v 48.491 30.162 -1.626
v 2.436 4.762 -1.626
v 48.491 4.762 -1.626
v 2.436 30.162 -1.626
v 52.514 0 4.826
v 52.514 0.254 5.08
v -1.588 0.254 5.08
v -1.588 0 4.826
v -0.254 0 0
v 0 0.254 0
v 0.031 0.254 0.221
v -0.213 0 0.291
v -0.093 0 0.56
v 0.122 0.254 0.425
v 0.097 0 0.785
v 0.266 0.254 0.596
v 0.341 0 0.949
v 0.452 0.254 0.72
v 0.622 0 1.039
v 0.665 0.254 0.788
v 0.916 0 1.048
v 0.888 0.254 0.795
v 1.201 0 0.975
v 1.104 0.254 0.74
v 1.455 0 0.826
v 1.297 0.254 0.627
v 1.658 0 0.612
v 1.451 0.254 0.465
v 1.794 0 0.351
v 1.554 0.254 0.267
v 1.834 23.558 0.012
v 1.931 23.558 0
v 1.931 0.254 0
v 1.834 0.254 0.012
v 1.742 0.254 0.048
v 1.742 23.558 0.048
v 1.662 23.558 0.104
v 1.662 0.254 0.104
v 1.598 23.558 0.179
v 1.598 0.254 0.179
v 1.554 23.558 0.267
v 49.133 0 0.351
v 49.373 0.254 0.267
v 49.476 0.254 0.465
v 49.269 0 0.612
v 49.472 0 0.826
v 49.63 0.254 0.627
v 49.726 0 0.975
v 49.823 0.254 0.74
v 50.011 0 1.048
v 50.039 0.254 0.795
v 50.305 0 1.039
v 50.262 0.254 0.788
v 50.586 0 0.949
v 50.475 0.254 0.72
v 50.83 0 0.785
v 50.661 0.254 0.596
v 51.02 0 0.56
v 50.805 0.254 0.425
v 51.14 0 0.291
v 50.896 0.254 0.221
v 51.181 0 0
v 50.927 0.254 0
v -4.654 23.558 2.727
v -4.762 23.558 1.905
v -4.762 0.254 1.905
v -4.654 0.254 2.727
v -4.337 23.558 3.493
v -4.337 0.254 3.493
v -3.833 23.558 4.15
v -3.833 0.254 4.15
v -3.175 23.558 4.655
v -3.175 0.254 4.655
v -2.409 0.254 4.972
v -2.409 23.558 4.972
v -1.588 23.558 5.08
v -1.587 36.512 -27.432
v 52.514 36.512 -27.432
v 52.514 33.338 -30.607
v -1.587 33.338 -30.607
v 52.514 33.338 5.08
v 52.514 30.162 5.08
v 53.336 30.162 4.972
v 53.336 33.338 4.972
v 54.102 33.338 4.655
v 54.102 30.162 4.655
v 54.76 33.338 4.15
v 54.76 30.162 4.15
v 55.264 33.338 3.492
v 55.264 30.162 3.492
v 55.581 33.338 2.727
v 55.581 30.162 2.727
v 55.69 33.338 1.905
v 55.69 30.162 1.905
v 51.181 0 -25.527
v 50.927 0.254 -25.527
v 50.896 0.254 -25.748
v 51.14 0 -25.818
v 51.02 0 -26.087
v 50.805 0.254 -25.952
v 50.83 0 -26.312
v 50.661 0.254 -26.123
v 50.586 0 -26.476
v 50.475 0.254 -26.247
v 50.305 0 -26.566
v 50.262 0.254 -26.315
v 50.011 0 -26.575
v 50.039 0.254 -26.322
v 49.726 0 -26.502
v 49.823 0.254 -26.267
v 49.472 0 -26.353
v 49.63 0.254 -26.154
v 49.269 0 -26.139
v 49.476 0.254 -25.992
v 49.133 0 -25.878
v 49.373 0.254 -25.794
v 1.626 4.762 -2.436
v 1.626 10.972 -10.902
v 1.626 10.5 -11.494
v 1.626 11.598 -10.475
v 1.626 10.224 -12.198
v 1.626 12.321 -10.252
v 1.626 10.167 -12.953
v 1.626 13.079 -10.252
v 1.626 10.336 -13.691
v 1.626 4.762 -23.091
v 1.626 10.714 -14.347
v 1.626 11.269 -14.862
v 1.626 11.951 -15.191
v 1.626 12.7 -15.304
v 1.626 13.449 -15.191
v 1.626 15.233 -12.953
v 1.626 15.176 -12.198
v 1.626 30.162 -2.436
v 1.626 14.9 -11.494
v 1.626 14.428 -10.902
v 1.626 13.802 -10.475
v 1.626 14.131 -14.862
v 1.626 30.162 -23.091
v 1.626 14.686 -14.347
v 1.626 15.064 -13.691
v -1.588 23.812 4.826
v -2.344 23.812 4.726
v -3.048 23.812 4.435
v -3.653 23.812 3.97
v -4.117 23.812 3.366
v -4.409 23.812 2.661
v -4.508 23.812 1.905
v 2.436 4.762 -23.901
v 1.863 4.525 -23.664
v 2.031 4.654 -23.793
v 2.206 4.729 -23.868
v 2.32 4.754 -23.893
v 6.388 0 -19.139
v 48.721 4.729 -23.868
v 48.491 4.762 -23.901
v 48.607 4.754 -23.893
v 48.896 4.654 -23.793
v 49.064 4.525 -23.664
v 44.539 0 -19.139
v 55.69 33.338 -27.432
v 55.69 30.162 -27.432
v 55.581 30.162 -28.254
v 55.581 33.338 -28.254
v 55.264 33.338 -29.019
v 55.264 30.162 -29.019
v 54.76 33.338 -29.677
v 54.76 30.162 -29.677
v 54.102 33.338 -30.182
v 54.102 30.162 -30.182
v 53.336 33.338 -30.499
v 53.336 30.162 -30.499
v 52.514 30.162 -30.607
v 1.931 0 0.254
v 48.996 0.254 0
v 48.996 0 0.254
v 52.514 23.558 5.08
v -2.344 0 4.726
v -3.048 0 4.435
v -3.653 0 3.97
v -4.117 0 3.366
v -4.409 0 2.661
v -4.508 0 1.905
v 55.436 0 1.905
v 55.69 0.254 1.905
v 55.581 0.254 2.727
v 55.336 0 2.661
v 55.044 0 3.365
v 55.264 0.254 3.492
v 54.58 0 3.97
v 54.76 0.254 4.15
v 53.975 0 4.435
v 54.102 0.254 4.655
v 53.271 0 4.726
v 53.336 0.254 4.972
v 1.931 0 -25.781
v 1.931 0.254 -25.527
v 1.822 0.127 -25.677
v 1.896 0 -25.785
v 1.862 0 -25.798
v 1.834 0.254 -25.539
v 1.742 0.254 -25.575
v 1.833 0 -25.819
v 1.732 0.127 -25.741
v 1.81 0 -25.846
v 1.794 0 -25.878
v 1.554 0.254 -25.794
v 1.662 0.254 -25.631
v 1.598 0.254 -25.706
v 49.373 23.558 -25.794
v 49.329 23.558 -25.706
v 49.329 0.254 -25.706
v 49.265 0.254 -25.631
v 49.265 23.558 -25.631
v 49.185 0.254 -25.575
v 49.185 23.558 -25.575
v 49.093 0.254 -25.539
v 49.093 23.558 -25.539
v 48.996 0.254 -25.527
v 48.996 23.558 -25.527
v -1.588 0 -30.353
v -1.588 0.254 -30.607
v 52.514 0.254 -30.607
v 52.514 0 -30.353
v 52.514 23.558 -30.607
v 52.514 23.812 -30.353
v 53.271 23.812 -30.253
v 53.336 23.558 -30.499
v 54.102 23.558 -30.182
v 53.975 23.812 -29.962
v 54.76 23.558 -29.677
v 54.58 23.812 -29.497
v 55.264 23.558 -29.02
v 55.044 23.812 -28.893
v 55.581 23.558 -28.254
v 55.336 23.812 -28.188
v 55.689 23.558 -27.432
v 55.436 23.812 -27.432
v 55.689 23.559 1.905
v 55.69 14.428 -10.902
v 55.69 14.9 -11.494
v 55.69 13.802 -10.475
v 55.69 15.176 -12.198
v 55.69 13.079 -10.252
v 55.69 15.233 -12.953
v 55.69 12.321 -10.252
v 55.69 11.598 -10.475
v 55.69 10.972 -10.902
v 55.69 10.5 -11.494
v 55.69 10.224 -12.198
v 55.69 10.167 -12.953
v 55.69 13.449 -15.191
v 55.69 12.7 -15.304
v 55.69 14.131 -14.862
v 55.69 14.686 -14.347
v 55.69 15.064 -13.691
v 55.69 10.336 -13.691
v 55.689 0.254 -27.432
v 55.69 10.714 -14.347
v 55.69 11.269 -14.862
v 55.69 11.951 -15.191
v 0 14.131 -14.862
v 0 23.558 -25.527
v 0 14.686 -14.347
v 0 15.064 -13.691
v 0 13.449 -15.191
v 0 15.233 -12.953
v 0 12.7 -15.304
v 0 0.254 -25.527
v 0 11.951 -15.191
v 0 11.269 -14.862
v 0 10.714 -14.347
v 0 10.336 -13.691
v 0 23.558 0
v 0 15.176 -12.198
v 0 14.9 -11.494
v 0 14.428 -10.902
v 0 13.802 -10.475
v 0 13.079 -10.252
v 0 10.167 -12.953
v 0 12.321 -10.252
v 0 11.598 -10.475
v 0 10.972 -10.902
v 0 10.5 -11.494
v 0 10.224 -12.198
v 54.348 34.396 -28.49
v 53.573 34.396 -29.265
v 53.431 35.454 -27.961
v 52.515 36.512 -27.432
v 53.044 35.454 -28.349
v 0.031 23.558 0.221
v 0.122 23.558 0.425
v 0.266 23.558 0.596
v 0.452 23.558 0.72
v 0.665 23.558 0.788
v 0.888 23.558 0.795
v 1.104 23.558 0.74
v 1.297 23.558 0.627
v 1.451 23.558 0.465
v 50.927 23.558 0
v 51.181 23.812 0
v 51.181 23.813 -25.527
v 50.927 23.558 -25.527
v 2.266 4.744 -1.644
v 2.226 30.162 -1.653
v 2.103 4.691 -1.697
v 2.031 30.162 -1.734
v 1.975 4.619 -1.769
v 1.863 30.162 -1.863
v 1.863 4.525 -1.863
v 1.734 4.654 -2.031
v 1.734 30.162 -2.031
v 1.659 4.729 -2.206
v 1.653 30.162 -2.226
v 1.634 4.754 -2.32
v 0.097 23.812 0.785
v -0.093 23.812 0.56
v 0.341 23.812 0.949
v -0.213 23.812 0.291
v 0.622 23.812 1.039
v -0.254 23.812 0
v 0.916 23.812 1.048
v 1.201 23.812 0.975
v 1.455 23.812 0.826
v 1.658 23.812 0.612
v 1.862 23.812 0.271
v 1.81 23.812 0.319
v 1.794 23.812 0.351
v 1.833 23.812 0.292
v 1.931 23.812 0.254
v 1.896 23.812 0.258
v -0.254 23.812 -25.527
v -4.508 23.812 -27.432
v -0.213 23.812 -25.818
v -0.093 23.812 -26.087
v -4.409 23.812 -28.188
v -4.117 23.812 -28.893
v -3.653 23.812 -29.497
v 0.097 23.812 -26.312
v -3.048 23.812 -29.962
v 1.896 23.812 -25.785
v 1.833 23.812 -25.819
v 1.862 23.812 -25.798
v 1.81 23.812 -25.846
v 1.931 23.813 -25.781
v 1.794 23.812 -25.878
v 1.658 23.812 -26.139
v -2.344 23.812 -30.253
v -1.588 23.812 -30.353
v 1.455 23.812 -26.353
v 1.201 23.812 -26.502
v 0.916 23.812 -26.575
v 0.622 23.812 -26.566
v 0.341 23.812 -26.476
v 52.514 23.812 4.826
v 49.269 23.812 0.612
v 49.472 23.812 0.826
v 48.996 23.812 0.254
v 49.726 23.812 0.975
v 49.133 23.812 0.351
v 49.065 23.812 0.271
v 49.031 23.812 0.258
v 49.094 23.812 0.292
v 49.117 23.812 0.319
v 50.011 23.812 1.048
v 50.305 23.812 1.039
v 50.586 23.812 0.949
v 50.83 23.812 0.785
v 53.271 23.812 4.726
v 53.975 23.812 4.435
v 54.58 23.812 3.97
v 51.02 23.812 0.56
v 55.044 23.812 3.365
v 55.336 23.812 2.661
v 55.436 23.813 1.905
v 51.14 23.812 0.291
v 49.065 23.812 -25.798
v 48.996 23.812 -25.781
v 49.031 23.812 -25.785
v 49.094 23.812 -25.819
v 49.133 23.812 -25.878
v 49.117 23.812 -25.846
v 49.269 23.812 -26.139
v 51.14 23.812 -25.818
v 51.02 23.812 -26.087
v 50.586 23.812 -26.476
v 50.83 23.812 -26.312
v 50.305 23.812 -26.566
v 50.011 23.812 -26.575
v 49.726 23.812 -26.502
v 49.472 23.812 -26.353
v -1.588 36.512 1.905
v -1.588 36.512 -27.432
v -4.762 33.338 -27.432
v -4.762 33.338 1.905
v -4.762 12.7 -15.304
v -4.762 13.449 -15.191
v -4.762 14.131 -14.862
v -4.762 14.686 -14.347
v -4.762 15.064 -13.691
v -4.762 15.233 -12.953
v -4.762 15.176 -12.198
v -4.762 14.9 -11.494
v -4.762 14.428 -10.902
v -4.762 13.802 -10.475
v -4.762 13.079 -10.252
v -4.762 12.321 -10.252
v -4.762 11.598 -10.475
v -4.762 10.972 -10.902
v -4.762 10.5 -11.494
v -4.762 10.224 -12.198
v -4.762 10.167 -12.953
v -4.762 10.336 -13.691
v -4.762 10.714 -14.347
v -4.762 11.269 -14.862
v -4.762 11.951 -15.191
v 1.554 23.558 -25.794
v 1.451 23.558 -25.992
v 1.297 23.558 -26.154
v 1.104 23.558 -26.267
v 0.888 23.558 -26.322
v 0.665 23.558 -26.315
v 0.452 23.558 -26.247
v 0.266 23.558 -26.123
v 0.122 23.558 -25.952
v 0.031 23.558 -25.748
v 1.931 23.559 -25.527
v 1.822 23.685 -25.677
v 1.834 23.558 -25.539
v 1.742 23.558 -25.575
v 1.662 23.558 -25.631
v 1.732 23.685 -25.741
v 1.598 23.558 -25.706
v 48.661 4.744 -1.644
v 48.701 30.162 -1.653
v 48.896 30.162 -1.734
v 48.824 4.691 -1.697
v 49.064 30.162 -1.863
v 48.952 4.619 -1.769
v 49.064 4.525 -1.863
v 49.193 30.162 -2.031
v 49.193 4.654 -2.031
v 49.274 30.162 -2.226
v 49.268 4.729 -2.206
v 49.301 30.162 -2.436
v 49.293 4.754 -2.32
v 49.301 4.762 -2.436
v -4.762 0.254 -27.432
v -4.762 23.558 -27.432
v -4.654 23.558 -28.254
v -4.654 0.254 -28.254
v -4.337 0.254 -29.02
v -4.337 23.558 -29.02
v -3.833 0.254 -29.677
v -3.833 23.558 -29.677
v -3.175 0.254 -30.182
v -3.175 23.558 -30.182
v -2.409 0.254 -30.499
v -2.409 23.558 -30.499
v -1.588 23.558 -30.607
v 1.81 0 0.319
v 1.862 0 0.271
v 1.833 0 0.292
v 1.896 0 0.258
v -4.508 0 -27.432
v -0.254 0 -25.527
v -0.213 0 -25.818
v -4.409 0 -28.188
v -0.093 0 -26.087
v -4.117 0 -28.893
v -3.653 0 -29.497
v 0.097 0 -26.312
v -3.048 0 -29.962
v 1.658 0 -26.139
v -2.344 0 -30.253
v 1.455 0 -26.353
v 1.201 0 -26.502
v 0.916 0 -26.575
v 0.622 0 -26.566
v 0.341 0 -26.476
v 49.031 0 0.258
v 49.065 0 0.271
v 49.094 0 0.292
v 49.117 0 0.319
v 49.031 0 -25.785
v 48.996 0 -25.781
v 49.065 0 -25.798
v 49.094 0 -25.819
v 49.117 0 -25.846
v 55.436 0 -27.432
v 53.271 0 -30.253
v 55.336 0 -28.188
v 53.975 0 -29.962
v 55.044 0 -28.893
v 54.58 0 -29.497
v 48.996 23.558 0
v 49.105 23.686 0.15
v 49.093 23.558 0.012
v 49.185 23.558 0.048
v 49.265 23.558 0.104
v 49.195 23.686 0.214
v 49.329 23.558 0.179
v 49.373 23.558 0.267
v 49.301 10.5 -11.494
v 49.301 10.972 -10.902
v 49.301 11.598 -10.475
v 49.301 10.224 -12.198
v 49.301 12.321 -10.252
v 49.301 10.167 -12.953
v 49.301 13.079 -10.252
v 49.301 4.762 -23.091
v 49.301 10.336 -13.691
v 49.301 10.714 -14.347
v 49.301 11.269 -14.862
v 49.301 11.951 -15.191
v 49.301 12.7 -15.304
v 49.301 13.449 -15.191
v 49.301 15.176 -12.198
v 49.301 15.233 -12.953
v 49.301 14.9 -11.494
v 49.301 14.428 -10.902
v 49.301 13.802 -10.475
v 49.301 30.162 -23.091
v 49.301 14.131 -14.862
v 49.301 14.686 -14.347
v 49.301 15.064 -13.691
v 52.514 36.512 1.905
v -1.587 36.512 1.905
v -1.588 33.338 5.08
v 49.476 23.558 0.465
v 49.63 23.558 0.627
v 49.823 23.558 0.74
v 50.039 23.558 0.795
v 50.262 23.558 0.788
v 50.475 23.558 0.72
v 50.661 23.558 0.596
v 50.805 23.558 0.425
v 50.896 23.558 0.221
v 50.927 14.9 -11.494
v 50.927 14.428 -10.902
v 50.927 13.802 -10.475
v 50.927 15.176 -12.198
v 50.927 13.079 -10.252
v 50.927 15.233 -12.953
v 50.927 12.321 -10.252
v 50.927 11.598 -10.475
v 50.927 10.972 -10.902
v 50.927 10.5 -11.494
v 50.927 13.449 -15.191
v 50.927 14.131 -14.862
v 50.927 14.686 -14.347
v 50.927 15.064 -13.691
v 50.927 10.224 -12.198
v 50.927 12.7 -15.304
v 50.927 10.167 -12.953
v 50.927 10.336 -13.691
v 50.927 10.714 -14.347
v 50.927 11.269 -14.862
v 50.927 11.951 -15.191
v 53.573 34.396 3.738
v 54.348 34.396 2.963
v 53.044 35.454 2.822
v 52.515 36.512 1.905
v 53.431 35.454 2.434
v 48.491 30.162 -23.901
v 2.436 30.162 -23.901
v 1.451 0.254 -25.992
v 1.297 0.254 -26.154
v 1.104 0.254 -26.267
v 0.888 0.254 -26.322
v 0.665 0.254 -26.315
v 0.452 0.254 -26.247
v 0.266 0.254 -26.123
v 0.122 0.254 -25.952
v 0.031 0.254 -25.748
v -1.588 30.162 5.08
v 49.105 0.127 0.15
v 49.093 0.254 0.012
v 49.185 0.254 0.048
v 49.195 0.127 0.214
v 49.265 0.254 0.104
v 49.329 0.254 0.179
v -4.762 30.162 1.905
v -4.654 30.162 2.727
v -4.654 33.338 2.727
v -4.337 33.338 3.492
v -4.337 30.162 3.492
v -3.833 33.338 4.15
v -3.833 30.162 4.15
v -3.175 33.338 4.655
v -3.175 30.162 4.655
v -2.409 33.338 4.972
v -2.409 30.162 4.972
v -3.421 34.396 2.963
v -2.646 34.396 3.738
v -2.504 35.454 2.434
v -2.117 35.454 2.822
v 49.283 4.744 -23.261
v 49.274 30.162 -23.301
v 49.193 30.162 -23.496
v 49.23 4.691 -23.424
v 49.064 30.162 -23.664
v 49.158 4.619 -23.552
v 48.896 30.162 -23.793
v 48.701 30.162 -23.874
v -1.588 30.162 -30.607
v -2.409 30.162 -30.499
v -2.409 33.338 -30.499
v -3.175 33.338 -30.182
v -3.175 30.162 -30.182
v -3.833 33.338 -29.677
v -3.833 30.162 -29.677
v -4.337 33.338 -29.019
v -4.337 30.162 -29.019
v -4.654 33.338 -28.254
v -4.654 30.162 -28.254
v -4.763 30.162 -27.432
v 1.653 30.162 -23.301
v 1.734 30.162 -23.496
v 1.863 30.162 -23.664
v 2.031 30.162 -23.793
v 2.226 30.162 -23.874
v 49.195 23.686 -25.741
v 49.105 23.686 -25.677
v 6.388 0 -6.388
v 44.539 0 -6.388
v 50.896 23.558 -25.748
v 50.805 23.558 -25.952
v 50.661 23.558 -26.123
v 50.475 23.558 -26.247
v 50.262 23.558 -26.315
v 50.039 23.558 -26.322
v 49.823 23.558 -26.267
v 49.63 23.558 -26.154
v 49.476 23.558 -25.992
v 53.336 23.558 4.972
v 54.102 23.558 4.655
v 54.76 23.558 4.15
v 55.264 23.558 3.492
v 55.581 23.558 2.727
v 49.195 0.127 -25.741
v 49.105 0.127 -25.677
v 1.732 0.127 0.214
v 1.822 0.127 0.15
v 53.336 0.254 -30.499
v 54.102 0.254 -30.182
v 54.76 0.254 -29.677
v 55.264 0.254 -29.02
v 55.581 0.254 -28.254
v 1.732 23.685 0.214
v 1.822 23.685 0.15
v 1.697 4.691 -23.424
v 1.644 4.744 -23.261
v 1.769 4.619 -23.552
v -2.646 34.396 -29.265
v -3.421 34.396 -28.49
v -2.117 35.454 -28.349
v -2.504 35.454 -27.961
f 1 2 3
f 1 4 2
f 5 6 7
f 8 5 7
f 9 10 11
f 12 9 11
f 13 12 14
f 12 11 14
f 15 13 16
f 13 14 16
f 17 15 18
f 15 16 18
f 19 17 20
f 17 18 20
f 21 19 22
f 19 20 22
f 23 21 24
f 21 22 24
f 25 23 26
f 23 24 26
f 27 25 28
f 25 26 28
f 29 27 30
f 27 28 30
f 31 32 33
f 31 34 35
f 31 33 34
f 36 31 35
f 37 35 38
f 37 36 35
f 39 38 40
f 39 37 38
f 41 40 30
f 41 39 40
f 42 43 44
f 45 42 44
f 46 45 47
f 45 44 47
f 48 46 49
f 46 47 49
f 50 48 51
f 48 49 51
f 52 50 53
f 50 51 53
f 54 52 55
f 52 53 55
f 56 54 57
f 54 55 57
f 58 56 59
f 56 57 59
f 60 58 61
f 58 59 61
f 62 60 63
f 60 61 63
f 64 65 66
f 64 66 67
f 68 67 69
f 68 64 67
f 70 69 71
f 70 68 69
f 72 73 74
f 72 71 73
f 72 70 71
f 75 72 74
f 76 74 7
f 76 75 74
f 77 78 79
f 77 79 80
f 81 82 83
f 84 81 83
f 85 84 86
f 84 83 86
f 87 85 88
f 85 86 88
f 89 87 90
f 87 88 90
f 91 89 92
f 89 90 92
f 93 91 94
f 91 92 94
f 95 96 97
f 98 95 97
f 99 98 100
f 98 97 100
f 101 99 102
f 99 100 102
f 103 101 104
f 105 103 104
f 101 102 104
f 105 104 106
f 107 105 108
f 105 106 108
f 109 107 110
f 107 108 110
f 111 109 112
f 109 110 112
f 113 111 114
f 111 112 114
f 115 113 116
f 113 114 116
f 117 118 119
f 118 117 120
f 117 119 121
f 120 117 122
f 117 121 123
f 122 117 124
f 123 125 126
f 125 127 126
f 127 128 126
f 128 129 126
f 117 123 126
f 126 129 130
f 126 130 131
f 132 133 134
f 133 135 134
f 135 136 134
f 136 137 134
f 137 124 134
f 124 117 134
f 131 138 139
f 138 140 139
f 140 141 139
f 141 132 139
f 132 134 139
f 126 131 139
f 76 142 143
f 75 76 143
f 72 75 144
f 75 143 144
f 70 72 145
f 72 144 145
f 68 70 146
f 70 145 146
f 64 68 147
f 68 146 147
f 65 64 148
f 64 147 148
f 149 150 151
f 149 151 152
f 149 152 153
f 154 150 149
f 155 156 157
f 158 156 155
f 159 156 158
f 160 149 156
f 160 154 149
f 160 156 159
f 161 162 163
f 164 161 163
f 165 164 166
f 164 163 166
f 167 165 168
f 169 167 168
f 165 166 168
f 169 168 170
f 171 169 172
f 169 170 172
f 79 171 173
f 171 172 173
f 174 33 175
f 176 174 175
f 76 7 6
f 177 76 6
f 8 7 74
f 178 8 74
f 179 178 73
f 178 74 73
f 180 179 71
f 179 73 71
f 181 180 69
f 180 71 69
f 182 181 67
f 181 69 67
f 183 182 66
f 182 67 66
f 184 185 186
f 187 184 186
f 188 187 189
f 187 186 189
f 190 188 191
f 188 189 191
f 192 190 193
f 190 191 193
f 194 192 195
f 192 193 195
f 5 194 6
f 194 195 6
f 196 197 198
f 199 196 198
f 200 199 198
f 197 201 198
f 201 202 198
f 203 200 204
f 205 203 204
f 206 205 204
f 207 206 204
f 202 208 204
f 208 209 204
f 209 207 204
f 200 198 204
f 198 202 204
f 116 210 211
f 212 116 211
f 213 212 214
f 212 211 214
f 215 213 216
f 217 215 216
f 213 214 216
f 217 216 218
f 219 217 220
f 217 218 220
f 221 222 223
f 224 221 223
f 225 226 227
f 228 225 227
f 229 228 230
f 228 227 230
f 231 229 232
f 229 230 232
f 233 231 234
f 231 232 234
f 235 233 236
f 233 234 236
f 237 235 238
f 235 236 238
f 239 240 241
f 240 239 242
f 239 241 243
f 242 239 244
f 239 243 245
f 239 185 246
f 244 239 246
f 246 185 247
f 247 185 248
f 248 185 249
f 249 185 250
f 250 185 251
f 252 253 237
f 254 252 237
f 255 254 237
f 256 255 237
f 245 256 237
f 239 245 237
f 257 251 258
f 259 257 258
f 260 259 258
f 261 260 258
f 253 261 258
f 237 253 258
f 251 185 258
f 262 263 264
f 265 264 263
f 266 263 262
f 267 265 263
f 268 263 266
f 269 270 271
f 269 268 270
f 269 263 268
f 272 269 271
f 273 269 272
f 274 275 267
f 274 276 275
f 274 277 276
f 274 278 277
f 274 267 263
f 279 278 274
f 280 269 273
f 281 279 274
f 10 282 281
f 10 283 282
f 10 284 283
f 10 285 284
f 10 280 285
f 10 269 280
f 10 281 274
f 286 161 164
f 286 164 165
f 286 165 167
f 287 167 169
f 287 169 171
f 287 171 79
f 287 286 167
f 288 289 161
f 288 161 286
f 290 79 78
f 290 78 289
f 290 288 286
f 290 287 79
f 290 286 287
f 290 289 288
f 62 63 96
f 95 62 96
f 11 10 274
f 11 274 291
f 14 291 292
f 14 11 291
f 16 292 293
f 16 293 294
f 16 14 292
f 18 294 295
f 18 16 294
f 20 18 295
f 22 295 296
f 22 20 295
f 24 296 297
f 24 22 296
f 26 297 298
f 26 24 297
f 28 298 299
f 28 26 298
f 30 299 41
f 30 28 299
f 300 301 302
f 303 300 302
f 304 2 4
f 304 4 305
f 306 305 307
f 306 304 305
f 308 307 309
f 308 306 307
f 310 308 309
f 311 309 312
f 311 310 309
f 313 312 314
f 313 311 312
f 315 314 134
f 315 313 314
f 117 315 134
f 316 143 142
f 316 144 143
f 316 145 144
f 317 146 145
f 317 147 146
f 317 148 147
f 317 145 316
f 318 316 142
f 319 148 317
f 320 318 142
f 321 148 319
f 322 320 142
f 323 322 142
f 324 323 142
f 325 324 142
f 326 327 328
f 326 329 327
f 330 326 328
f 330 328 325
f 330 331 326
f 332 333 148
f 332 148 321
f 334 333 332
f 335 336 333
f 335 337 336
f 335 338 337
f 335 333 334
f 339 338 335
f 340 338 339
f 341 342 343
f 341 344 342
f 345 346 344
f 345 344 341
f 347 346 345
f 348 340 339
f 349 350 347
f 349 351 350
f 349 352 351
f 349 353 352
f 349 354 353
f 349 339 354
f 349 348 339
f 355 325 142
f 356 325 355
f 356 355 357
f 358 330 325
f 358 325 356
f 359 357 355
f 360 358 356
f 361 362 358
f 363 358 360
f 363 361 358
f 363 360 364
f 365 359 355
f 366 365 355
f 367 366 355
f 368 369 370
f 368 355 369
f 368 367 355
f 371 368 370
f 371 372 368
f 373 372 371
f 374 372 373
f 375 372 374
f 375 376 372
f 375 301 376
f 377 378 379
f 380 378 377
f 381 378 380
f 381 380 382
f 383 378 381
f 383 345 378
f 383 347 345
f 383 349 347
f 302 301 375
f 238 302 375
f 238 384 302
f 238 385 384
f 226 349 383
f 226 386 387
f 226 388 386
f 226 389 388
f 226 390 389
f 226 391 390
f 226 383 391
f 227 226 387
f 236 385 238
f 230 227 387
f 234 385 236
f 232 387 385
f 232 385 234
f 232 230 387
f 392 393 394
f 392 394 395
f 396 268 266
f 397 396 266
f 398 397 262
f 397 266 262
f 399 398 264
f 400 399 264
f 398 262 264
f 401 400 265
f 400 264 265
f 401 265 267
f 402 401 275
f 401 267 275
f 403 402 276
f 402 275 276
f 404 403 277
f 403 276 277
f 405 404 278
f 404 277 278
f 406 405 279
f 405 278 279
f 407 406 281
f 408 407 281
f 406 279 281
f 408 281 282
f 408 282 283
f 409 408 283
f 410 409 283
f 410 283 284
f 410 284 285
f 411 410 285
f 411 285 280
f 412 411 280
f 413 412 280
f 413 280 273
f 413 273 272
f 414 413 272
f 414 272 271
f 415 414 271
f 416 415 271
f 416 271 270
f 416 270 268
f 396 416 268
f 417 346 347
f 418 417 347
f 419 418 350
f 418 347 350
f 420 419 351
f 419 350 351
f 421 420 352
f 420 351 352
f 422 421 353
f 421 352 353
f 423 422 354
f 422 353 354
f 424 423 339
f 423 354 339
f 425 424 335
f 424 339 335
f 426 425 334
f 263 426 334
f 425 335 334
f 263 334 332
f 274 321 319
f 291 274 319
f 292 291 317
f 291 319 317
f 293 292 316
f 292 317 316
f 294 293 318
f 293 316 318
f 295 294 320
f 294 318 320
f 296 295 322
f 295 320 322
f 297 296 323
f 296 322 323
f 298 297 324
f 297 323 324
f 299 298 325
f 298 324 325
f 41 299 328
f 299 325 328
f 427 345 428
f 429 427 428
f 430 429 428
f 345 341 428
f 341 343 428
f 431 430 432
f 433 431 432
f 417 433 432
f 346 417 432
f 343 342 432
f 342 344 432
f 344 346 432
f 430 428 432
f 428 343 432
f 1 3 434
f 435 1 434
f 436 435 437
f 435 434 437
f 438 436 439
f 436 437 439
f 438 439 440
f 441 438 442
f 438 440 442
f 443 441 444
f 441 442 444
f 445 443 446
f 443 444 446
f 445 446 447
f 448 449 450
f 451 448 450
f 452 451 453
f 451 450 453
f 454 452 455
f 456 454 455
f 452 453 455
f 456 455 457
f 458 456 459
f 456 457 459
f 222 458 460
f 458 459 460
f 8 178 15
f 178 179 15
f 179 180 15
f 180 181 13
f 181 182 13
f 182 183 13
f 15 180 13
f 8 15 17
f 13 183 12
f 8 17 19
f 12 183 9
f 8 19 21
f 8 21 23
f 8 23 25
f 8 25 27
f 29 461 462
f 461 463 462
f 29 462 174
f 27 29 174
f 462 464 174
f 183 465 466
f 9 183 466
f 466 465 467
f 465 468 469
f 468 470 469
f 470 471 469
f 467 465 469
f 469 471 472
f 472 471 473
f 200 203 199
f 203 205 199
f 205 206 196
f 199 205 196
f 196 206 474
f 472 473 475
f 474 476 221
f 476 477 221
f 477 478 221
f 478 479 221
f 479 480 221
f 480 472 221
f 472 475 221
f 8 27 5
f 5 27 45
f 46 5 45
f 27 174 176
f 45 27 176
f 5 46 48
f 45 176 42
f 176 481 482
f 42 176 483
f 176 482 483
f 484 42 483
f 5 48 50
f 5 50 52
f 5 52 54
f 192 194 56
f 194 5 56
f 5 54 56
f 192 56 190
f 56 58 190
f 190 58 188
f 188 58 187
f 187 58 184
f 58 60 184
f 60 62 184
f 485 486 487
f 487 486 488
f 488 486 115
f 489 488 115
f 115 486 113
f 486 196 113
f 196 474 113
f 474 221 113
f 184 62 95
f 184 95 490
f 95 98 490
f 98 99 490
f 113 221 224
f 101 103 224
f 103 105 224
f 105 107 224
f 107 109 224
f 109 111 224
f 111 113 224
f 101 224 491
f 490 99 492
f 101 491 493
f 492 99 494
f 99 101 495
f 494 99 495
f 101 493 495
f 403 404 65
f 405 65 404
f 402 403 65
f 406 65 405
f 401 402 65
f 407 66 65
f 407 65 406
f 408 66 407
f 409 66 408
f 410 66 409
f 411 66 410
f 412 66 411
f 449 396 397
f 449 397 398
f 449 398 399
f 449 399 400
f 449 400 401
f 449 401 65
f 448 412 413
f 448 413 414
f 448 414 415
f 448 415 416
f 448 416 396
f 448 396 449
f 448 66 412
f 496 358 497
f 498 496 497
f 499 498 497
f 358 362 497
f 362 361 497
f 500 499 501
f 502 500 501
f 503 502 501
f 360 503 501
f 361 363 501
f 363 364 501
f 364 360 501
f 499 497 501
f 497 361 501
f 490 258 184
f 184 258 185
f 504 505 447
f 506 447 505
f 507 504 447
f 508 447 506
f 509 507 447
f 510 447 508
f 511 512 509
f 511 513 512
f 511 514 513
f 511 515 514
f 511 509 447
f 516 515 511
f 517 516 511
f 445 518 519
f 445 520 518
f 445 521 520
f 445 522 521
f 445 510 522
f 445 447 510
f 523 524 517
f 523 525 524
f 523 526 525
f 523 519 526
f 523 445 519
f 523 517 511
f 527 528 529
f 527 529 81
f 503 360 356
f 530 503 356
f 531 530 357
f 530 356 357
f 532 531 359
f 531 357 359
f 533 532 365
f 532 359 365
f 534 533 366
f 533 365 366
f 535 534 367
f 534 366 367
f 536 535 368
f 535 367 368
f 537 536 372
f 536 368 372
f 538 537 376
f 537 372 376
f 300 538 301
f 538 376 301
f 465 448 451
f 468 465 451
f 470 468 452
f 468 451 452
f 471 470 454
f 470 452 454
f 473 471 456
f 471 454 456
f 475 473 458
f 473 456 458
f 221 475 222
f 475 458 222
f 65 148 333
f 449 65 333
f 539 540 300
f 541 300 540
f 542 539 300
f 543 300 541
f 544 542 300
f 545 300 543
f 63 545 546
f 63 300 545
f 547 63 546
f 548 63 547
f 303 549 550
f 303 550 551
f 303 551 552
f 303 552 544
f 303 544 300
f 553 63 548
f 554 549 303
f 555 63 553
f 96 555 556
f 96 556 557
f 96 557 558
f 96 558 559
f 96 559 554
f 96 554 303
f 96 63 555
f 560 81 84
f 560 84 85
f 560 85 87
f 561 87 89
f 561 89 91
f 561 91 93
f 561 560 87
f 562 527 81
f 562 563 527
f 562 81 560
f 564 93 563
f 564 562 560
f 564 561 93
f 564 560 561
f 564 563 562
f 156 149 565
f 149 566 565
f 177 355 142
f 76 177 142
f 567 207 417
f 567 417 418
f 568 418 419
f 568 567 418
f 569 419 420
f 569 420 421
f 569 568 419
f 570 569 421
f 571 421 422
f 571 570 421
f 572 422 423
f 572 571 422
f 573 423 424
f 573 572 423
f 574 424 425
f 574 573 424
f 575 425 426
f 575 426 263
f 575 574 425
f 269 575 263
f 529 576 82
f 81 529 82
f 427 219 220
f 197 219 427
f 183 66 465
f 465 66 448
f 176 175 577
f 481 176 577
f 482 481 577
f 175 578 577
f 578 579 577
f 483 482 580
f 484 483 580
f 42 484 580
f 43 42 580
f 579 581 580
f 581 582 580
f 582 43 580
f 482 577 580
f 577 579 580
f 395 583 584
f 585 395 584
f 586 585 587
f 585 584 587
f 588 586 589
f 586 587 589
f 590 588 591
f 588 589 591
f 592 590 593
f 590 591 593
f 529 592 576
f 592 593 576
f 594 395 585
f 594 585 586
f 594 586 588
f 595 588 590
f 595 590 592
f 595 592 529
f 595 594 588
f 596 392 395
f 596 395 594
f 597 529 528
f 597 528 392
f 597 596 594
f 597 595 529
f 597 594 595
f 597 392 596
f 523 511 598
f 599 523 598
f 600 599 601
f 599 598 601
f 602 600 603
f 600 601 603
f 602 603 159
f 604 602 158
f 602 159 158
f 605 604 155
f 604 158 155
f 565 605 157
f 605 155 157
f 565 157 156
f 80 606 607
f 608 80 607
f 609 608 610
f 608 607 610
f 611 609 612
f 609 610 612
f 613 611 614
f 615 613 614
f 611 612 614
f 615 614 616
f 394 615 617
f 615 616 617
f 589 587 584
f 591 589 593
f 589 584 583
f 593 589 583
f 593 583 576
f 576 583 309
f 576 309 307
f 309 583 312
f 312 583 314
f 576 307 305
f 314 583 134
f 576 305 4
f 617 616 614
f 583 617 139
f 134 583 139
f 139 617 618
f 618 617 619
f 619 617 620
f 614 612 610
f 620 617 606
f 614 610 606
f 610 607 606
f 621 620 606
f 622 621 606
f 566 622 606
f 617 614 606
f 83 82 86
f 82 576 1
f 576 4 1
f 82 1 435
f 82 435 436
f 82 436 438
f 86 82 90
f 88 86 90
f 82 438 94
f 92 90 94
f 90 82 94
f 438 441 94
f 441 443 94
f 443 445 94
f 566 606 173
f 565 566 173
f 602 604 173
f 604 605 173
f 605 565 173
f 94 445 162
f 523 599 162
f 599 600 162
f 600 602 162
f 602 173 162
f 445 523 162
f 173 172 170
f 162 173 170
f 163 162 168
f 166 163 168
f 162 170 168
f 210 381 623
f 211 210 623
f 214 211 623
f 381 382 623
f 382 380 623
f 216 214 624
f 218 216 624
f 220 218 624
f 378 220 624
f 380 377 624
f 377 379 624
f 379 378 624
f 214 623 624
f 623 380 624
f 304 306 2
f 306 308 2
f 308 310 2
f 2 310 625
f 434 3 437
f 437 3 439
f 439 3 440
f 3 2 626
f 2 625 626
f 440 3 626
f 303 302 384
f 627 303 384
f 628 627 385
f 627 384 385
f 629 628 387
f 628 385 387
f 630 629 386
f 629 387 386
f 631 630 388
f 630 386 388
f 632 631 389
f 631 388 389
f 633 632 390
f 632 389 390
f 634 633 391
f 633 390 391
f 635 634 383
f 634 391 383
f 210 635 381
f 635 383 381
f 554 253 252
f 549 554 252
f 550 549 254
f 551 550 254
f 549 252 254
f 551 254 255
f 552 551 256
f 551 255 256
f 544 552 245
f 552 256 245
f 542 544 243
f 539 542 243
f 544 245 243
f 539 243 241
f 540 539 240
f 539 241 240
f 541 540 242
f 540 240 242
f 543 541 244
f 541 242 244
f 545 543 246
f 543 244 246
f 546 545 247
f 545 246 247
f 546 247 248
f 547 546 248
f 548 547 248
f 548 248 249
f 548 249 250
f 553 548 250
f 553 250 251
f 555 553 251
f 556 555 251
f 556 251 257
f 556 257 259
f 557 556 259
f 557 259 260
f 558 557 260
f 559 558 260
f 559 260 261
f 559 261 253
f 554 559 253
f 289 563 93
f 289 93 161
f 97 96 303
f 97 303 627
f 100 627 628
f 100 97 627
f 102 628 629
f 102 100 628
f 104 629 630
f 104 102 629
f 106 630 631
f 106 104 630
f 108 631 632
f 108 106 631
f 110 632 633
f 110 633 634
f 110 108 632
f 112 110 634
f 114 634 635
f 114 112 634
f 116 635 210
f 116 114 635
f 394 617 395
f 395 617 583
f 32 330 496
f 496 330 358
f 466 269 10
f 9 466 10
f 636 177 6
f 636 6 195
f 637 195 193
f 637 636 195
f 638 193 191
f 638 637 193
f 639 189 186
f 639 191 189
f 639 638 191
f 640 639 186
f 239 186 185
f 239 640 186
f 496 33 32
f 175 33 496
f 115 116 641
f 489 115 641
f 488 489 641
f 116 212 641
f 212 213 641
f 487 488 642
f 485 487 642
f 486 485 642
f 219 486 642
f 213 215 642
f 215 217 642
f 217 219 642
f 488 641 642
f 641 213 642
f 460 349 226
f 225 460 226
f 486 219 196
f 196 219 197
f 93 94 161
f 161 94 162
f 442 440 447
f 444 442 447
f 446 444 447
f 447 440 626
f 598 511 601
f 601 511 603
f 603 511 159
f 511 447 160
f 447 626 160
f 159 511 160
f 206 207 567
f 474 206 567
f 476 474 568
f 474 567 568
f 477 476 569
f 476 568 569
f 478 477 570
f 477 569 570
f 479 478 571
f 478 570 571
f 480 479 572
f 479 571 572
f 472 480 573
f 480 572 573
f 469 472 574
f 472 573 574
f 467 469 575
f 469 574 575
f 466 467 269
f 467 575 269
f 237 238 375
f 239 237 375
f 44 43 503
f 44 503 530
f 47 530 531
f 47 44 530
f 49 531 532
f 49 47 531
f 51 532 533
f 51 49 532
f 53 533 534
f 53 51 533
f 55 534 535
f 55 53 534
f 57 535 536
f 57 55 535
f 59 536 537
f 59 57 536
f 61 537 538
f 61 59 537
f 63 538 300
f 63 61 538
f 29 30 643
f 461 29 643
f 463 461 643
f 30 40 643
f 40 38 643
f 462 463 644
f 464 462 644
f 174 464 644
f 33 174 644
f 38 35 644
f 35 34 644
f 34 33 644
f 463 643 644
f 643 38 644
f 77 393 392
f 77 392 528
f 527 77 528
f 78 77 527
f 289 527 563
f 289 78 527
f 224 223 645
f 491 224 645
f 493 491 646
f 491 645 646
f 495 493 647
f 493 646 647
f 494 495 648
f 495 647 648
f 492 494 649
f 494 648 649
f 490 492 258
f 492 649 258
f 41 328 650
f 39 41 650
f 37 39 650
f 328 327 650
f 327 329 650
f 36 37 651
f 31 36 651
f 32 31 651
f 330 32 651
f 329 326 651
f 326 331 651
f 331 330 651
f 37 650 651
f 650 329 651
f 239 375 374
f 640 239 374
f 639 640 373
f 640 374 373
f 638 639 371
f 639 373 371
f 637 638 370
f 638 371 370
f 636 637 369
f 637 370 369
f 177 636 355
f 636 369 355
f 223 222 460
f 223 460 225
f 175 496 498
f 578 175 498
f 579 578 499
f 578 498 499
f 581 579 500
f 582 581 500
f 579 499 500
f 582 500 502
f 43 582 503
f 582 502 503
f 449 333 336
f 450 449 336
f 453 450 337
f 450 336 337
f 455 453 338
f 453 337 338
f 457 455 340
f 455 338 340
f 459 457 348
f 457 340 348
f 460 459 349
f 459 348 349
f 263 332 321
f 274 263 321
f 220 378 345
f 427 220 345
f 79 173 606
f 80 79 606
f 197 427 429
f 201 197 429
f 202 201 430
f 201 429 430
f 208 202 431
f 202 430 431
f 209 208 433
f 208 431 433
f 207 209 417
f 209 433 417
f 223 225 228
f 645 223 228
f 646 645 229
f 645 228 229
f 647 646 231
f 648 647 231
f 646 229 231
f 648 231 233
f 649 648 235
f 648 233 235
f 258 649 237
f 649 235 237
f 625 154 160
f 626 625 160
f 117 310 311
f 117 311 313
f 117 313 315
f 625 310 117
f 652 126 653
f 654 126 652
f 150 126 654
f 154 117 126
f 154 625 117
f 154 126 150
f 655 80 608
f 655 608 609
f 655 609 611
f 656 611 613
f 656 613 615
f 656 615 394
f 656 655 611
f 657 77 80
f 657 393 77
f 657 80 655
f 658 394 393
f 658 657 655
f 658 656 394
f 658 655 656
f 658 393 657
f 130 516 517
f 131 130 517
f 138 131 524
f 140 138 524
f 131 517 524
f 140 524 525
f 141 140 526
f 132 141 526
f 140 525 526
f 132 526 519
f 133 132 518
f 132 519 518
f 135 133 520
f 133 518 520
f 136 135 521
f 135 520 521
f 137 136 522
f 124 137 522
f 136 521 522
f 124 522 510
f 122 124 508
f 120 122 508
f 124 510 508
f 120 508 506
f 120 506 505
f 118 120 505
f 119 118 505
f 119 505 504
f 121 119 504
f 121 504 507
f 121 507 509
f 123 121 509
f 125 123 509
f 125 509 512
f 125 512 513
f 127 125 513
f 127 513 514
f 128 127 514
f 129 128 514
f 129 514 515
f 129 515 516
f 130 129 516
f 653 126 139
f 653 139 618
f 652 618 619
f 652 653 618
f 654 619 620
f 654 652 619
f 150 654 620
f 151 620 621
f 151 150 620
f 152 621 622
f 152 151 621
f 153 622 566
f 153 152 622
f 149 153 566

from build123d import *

# Parameters (mm, degrees)
SKETCH1_W           = 60.452
SKETCH1_H           = 35.687
BOSS_EXTRUDE1_DEPTH = 23.8125
FILLET1_R           = 3.175
FILLET2_R           = 0.4
SKETCH2_W           = 47.6758
SKETCH2_H           = 22.2758
BOSS_EXTRUDE2_DEPTH = 6.35
SKETCH2_4_W         = 47.6758
SKETCH2_4_H         = 22.2758
BOSS_EXTRUDE3_DEPTH = 30.1625
CHAMFER1_SIZE       = 3.175
CHAMFER2_SIZE       = 4.7625
CHAMFER3_SIZE       = 0.254
FILLET3_R           = 0.810638298
SKETCH3_R           = 2.54
CUT_EXTRUDE1_DEPTH  = 77.970094253


with BuildPart() as part:
    # Sketch1 → Boss-Extrude1 (new body)
    with BuildSketch(Plane(origin=(0, 0, 0), x_dir=(1, 0, 0), z_dir=(0, 1, 0))):
        with Locations((25.4635, 12.7635)):
            Rectangle(SKETCH1_W, SKETCH1_H)
        with BuildLine():
            Line((1.599999848, 0), (49.327000152, 0))
            ThreePointArc((49.327000152, 0), (50.127000076, -0.799999924), (50.927, 0))
            Line((50.927, 0), (50.927, 25.527))
            ThreePointArc((50.927, 25.527), (50.127000076, 26.326999924), (49.327000152, 25.527))
            Line((49.327000152, 25.527), (1.599999848, 25.527))
            ThreePointArc((1.599999848, 25.527), (0.799999924, 26.326999924), (0, 25.527))
            Line((0, 25.527), (0, 0))
            ThreePointArc((0, 0), (0.799999924, -0.799999924), (1.599999848, 0))
        make_face(mode=Mode.SUBTRACT)
    extrude(amount=BOSS_EXTRUDE1_DEPTH)

    # Fillet1
    fillet1_edges = [part.edges().sort_by_distance(p)[0] for p in [
        (-4.7625, 11.90625, -30.607),
        (55.6895, 11.90625, -30.607),
        (55.6895, 11.90625, 5.08),
        (-4.7625, 11.90625, 5.08),
    ]]
    fillet(fillet1_edges, radius=FILLET1_R)

    # Fillet2
    fillet2_edges = [part.edges().sort_by_distance(p)[0] for p in [
        (1.599999848, 11.90625, 0),
        (49.327000152, 11.90625, 0),
        (49.327000152, 11.90625, -25.527),
        (1.599999848, 11.90625, -25.527),
    ]]
    fillet(fillet2_edges, radius=FILLET2_R)

    # Chamfer3
    chamfer3_edges = [part.edges().sort_by_distance(p)[0] for p in [
        (0.664718345, 0, 0.788478771),
        (50.927, 0, -12.7635),
        (50.262281655, 0, -26.315478771),
        (0, 0, -12.7635),
        (0.664718345, 23.8125, 0.788478771),
        (50.927, 23.8125, -12.7635),
        (50.262281655, 23.8125, -26.315478771),
        (0, 23.8125, -12.7635),
        (-4.7625, 0, -12.7635),
        (-4.7625, 23.8125, -12.7635),
        (25.4635, 0, -30.607),
        (55.6895, 0, -12.7635),
        (25.4635, 0, 5.08),
        (-3.83256403, 0, 4.15006403),
        (54.75956403, 0, 4.15006403),
        (54.75956403, 0, -29.67706403),
        (-3.83256403, 0, -29.67706403),
        (25.4635, 23.8125, -30.607),
        (25.4635, 23.8125, 5.08),
        (55.6895, 23.8125, -12.7635),
        (-3.83256403, 23.8125, 4.15006403),
        (54.75956403, 23.8125, 4.15006403),
        (54.75956403, 23.8125, -29.67706403),
        (-3.83256403, 23.8125, -29.67706403),
        (25.4635, 0, 0),
        (25.4635, 23.8125, 0),
        (50.262281655, 0, 0.788478771),
        (25.4635, 0, -25.527),
        (0.664718345, 0, -26.315478771),
        (1.700430589, 0, 0.073401365),
        (1.700430589, 0, -25.600401365),
        (49.226569411, 0, -25.600401365),
        (49.226569411, 0, 0.073401365),
        (50.262281655, 23.8125, 0.788478771),
        (0.664718345, 23.8125, -26.315478771),
        (25.4635, 23.8125, -25.527),
        (1.700430589, 23.8125, 0.073401365),
        (1.700430589, 23.8125, -25.600401365),
        (49.226569411, 23.8125, -25.600401365),
        (49.226569411, 23.8125, 0.073401365),
    ]]
    chamfer(chamfer3_edges, length=CHAMFER3_SIZE)


with BuildPart() as body_2:
    # Sketch2 → Boss-Extrude2 (new body)
    # profile 1 of 2: a face of its own
    with BuildSketch(Plane(origin=(0, 30.1625, 0), x_dir=(1, 0, 0), z_dir=(0, 1, 0))):
        with BuildLine():
            Line((55.6895, -1.905), (55.6895, 27.432))
            ThreePointArc((55.6895, 27.432), (54.75956403, 29.67706403), (52.5145, 30.607))
            Line((52.5145, 30.607), (-1.5875, 30.607))
            ThreePointArc((-1.5875, 30.607), (-3.83256403, 29.67706403), (-4.7625, 27.432))
            Line((-4.7625, 27.432), (-4.7625, -1.905))
            ThreePointArc((-4.7625, -1.905), (-3.83256403, -4.15006403), (-1.5875, -5.08))
            Line((-1.5875, -5.08), (52.5145, -5.08))
            ThreePointArc((52.5145, -5.08), (54.75956403, -4.15006403), (55.6895, -1.905))
        make_face()
        with Locations((25.4635, 12.7635)):
            Rectangle(SKETCH2_W, SKETCH2_H, mode=Mode.SUBTRACT)
    # profile 2 of 2: a face of its own
    with BuildSketch(Plane(origin=(0, 30.1625, 0), x_dir=(1, 0, 0), z_dir=(0, 1, 0))):
        with Locations((25.4635, 12.7635)):
            Rectangle(SKETCH2_W, SKETCH2_H)
    extrude(amount=BOSS_EXTRUDE2_DEPTH)

    # Sketch2<4> → Boss-Extrude3 (add)
    with BuildSketch(Plane(origin=(0, 30.1625, 0), x_dir=(1, 0, 0), z_dir=(0, 1, 0))):
        with Locations((25.4635, 12.7635)):
            Rectangle(SKETCH2_4_W, SKETCH2_4_H)
    extrude(amount=-BOSS_EXTRUDE3_DEPTH)

    # Chamfer1
    chamfer1_edges = [body_2.edges().sort_by_distance(p)[0] for p in [
        (54.75956403, 36.5125, -29.67706403),
        (25.4635, 36.5125, -30.607),
        (-3.83256403, 36.5125, -29.67706403),
        (-4.7625, 36.5125, -12.7635),
        (-3.83256403, 36.5125, 4.15006403),
        (25.4635, 36.5125, 5.08),
        (54.75956403, 36.5125, 4.15006403),
        (55.6895, 36.5125, -12.7635),
    ]]
    chamfer(chamfer1_edges, length=CHAMFER1_SIZE - 0.0001)  # a hair under: the kernel refuses the full size

    # Chamfer2
    chamfer2_edges = [body_2.edges().sort_by_distance(p)[0] for p in [
        (1.6256, 0, -12.7635),
        (25.4635, 0, -23.9014),
        (49.3014, 0, -12.7635),
        (25.4635, 0, -1.6256),
    ]]
    chamfer(chamfer2_edges, length=CHAMFER2_SIZE)

    # Fillet3
    fillet3_edges = [body_2.edges().sort_by_distance(p)[0] for p in [
        (1.6256, 17.4625, -23.9014),
        (1.6256, 17.4625, -1.6256),
        (49.3014, 17.4625, -1.6256),
        (49.3014, 17.4625, -23.9014),
    ]]
    fillet(fillet3_edges, radius=FILLET3_R)


with BuildPart() as cut_extrude1_tool:
    # Sketch3 → Cut-Extrude1 (new, through all)
    with BuildSketch(Plane(origin=(55.6895, 0, 0), x_dir=(0, 0, -1), z_dir=(1, 0, 0))):
        with Locations((12.7635, 12.7)):
            Circle(SKETCH3_R)
    extrude(amount=-CUT_EXTRUDE1_DEPTH)


with BuildPart() as part_1:
    add(part.part)

    # Cut-Extrude1: cut by cut_extrude1_tool
    add(cut_extrude1_tool.part, mode=Mode.SUBTRACT)


with BuildPart() as body_2_1:
    add(body_2.part)

    # Cut-Extrude1: cut by cut_extrude1_tool
    add(cut_extrude1_tool.part, mode=Mode.SUBTRACT)


solid = Compound([part_1.part, body_2_1.part])
